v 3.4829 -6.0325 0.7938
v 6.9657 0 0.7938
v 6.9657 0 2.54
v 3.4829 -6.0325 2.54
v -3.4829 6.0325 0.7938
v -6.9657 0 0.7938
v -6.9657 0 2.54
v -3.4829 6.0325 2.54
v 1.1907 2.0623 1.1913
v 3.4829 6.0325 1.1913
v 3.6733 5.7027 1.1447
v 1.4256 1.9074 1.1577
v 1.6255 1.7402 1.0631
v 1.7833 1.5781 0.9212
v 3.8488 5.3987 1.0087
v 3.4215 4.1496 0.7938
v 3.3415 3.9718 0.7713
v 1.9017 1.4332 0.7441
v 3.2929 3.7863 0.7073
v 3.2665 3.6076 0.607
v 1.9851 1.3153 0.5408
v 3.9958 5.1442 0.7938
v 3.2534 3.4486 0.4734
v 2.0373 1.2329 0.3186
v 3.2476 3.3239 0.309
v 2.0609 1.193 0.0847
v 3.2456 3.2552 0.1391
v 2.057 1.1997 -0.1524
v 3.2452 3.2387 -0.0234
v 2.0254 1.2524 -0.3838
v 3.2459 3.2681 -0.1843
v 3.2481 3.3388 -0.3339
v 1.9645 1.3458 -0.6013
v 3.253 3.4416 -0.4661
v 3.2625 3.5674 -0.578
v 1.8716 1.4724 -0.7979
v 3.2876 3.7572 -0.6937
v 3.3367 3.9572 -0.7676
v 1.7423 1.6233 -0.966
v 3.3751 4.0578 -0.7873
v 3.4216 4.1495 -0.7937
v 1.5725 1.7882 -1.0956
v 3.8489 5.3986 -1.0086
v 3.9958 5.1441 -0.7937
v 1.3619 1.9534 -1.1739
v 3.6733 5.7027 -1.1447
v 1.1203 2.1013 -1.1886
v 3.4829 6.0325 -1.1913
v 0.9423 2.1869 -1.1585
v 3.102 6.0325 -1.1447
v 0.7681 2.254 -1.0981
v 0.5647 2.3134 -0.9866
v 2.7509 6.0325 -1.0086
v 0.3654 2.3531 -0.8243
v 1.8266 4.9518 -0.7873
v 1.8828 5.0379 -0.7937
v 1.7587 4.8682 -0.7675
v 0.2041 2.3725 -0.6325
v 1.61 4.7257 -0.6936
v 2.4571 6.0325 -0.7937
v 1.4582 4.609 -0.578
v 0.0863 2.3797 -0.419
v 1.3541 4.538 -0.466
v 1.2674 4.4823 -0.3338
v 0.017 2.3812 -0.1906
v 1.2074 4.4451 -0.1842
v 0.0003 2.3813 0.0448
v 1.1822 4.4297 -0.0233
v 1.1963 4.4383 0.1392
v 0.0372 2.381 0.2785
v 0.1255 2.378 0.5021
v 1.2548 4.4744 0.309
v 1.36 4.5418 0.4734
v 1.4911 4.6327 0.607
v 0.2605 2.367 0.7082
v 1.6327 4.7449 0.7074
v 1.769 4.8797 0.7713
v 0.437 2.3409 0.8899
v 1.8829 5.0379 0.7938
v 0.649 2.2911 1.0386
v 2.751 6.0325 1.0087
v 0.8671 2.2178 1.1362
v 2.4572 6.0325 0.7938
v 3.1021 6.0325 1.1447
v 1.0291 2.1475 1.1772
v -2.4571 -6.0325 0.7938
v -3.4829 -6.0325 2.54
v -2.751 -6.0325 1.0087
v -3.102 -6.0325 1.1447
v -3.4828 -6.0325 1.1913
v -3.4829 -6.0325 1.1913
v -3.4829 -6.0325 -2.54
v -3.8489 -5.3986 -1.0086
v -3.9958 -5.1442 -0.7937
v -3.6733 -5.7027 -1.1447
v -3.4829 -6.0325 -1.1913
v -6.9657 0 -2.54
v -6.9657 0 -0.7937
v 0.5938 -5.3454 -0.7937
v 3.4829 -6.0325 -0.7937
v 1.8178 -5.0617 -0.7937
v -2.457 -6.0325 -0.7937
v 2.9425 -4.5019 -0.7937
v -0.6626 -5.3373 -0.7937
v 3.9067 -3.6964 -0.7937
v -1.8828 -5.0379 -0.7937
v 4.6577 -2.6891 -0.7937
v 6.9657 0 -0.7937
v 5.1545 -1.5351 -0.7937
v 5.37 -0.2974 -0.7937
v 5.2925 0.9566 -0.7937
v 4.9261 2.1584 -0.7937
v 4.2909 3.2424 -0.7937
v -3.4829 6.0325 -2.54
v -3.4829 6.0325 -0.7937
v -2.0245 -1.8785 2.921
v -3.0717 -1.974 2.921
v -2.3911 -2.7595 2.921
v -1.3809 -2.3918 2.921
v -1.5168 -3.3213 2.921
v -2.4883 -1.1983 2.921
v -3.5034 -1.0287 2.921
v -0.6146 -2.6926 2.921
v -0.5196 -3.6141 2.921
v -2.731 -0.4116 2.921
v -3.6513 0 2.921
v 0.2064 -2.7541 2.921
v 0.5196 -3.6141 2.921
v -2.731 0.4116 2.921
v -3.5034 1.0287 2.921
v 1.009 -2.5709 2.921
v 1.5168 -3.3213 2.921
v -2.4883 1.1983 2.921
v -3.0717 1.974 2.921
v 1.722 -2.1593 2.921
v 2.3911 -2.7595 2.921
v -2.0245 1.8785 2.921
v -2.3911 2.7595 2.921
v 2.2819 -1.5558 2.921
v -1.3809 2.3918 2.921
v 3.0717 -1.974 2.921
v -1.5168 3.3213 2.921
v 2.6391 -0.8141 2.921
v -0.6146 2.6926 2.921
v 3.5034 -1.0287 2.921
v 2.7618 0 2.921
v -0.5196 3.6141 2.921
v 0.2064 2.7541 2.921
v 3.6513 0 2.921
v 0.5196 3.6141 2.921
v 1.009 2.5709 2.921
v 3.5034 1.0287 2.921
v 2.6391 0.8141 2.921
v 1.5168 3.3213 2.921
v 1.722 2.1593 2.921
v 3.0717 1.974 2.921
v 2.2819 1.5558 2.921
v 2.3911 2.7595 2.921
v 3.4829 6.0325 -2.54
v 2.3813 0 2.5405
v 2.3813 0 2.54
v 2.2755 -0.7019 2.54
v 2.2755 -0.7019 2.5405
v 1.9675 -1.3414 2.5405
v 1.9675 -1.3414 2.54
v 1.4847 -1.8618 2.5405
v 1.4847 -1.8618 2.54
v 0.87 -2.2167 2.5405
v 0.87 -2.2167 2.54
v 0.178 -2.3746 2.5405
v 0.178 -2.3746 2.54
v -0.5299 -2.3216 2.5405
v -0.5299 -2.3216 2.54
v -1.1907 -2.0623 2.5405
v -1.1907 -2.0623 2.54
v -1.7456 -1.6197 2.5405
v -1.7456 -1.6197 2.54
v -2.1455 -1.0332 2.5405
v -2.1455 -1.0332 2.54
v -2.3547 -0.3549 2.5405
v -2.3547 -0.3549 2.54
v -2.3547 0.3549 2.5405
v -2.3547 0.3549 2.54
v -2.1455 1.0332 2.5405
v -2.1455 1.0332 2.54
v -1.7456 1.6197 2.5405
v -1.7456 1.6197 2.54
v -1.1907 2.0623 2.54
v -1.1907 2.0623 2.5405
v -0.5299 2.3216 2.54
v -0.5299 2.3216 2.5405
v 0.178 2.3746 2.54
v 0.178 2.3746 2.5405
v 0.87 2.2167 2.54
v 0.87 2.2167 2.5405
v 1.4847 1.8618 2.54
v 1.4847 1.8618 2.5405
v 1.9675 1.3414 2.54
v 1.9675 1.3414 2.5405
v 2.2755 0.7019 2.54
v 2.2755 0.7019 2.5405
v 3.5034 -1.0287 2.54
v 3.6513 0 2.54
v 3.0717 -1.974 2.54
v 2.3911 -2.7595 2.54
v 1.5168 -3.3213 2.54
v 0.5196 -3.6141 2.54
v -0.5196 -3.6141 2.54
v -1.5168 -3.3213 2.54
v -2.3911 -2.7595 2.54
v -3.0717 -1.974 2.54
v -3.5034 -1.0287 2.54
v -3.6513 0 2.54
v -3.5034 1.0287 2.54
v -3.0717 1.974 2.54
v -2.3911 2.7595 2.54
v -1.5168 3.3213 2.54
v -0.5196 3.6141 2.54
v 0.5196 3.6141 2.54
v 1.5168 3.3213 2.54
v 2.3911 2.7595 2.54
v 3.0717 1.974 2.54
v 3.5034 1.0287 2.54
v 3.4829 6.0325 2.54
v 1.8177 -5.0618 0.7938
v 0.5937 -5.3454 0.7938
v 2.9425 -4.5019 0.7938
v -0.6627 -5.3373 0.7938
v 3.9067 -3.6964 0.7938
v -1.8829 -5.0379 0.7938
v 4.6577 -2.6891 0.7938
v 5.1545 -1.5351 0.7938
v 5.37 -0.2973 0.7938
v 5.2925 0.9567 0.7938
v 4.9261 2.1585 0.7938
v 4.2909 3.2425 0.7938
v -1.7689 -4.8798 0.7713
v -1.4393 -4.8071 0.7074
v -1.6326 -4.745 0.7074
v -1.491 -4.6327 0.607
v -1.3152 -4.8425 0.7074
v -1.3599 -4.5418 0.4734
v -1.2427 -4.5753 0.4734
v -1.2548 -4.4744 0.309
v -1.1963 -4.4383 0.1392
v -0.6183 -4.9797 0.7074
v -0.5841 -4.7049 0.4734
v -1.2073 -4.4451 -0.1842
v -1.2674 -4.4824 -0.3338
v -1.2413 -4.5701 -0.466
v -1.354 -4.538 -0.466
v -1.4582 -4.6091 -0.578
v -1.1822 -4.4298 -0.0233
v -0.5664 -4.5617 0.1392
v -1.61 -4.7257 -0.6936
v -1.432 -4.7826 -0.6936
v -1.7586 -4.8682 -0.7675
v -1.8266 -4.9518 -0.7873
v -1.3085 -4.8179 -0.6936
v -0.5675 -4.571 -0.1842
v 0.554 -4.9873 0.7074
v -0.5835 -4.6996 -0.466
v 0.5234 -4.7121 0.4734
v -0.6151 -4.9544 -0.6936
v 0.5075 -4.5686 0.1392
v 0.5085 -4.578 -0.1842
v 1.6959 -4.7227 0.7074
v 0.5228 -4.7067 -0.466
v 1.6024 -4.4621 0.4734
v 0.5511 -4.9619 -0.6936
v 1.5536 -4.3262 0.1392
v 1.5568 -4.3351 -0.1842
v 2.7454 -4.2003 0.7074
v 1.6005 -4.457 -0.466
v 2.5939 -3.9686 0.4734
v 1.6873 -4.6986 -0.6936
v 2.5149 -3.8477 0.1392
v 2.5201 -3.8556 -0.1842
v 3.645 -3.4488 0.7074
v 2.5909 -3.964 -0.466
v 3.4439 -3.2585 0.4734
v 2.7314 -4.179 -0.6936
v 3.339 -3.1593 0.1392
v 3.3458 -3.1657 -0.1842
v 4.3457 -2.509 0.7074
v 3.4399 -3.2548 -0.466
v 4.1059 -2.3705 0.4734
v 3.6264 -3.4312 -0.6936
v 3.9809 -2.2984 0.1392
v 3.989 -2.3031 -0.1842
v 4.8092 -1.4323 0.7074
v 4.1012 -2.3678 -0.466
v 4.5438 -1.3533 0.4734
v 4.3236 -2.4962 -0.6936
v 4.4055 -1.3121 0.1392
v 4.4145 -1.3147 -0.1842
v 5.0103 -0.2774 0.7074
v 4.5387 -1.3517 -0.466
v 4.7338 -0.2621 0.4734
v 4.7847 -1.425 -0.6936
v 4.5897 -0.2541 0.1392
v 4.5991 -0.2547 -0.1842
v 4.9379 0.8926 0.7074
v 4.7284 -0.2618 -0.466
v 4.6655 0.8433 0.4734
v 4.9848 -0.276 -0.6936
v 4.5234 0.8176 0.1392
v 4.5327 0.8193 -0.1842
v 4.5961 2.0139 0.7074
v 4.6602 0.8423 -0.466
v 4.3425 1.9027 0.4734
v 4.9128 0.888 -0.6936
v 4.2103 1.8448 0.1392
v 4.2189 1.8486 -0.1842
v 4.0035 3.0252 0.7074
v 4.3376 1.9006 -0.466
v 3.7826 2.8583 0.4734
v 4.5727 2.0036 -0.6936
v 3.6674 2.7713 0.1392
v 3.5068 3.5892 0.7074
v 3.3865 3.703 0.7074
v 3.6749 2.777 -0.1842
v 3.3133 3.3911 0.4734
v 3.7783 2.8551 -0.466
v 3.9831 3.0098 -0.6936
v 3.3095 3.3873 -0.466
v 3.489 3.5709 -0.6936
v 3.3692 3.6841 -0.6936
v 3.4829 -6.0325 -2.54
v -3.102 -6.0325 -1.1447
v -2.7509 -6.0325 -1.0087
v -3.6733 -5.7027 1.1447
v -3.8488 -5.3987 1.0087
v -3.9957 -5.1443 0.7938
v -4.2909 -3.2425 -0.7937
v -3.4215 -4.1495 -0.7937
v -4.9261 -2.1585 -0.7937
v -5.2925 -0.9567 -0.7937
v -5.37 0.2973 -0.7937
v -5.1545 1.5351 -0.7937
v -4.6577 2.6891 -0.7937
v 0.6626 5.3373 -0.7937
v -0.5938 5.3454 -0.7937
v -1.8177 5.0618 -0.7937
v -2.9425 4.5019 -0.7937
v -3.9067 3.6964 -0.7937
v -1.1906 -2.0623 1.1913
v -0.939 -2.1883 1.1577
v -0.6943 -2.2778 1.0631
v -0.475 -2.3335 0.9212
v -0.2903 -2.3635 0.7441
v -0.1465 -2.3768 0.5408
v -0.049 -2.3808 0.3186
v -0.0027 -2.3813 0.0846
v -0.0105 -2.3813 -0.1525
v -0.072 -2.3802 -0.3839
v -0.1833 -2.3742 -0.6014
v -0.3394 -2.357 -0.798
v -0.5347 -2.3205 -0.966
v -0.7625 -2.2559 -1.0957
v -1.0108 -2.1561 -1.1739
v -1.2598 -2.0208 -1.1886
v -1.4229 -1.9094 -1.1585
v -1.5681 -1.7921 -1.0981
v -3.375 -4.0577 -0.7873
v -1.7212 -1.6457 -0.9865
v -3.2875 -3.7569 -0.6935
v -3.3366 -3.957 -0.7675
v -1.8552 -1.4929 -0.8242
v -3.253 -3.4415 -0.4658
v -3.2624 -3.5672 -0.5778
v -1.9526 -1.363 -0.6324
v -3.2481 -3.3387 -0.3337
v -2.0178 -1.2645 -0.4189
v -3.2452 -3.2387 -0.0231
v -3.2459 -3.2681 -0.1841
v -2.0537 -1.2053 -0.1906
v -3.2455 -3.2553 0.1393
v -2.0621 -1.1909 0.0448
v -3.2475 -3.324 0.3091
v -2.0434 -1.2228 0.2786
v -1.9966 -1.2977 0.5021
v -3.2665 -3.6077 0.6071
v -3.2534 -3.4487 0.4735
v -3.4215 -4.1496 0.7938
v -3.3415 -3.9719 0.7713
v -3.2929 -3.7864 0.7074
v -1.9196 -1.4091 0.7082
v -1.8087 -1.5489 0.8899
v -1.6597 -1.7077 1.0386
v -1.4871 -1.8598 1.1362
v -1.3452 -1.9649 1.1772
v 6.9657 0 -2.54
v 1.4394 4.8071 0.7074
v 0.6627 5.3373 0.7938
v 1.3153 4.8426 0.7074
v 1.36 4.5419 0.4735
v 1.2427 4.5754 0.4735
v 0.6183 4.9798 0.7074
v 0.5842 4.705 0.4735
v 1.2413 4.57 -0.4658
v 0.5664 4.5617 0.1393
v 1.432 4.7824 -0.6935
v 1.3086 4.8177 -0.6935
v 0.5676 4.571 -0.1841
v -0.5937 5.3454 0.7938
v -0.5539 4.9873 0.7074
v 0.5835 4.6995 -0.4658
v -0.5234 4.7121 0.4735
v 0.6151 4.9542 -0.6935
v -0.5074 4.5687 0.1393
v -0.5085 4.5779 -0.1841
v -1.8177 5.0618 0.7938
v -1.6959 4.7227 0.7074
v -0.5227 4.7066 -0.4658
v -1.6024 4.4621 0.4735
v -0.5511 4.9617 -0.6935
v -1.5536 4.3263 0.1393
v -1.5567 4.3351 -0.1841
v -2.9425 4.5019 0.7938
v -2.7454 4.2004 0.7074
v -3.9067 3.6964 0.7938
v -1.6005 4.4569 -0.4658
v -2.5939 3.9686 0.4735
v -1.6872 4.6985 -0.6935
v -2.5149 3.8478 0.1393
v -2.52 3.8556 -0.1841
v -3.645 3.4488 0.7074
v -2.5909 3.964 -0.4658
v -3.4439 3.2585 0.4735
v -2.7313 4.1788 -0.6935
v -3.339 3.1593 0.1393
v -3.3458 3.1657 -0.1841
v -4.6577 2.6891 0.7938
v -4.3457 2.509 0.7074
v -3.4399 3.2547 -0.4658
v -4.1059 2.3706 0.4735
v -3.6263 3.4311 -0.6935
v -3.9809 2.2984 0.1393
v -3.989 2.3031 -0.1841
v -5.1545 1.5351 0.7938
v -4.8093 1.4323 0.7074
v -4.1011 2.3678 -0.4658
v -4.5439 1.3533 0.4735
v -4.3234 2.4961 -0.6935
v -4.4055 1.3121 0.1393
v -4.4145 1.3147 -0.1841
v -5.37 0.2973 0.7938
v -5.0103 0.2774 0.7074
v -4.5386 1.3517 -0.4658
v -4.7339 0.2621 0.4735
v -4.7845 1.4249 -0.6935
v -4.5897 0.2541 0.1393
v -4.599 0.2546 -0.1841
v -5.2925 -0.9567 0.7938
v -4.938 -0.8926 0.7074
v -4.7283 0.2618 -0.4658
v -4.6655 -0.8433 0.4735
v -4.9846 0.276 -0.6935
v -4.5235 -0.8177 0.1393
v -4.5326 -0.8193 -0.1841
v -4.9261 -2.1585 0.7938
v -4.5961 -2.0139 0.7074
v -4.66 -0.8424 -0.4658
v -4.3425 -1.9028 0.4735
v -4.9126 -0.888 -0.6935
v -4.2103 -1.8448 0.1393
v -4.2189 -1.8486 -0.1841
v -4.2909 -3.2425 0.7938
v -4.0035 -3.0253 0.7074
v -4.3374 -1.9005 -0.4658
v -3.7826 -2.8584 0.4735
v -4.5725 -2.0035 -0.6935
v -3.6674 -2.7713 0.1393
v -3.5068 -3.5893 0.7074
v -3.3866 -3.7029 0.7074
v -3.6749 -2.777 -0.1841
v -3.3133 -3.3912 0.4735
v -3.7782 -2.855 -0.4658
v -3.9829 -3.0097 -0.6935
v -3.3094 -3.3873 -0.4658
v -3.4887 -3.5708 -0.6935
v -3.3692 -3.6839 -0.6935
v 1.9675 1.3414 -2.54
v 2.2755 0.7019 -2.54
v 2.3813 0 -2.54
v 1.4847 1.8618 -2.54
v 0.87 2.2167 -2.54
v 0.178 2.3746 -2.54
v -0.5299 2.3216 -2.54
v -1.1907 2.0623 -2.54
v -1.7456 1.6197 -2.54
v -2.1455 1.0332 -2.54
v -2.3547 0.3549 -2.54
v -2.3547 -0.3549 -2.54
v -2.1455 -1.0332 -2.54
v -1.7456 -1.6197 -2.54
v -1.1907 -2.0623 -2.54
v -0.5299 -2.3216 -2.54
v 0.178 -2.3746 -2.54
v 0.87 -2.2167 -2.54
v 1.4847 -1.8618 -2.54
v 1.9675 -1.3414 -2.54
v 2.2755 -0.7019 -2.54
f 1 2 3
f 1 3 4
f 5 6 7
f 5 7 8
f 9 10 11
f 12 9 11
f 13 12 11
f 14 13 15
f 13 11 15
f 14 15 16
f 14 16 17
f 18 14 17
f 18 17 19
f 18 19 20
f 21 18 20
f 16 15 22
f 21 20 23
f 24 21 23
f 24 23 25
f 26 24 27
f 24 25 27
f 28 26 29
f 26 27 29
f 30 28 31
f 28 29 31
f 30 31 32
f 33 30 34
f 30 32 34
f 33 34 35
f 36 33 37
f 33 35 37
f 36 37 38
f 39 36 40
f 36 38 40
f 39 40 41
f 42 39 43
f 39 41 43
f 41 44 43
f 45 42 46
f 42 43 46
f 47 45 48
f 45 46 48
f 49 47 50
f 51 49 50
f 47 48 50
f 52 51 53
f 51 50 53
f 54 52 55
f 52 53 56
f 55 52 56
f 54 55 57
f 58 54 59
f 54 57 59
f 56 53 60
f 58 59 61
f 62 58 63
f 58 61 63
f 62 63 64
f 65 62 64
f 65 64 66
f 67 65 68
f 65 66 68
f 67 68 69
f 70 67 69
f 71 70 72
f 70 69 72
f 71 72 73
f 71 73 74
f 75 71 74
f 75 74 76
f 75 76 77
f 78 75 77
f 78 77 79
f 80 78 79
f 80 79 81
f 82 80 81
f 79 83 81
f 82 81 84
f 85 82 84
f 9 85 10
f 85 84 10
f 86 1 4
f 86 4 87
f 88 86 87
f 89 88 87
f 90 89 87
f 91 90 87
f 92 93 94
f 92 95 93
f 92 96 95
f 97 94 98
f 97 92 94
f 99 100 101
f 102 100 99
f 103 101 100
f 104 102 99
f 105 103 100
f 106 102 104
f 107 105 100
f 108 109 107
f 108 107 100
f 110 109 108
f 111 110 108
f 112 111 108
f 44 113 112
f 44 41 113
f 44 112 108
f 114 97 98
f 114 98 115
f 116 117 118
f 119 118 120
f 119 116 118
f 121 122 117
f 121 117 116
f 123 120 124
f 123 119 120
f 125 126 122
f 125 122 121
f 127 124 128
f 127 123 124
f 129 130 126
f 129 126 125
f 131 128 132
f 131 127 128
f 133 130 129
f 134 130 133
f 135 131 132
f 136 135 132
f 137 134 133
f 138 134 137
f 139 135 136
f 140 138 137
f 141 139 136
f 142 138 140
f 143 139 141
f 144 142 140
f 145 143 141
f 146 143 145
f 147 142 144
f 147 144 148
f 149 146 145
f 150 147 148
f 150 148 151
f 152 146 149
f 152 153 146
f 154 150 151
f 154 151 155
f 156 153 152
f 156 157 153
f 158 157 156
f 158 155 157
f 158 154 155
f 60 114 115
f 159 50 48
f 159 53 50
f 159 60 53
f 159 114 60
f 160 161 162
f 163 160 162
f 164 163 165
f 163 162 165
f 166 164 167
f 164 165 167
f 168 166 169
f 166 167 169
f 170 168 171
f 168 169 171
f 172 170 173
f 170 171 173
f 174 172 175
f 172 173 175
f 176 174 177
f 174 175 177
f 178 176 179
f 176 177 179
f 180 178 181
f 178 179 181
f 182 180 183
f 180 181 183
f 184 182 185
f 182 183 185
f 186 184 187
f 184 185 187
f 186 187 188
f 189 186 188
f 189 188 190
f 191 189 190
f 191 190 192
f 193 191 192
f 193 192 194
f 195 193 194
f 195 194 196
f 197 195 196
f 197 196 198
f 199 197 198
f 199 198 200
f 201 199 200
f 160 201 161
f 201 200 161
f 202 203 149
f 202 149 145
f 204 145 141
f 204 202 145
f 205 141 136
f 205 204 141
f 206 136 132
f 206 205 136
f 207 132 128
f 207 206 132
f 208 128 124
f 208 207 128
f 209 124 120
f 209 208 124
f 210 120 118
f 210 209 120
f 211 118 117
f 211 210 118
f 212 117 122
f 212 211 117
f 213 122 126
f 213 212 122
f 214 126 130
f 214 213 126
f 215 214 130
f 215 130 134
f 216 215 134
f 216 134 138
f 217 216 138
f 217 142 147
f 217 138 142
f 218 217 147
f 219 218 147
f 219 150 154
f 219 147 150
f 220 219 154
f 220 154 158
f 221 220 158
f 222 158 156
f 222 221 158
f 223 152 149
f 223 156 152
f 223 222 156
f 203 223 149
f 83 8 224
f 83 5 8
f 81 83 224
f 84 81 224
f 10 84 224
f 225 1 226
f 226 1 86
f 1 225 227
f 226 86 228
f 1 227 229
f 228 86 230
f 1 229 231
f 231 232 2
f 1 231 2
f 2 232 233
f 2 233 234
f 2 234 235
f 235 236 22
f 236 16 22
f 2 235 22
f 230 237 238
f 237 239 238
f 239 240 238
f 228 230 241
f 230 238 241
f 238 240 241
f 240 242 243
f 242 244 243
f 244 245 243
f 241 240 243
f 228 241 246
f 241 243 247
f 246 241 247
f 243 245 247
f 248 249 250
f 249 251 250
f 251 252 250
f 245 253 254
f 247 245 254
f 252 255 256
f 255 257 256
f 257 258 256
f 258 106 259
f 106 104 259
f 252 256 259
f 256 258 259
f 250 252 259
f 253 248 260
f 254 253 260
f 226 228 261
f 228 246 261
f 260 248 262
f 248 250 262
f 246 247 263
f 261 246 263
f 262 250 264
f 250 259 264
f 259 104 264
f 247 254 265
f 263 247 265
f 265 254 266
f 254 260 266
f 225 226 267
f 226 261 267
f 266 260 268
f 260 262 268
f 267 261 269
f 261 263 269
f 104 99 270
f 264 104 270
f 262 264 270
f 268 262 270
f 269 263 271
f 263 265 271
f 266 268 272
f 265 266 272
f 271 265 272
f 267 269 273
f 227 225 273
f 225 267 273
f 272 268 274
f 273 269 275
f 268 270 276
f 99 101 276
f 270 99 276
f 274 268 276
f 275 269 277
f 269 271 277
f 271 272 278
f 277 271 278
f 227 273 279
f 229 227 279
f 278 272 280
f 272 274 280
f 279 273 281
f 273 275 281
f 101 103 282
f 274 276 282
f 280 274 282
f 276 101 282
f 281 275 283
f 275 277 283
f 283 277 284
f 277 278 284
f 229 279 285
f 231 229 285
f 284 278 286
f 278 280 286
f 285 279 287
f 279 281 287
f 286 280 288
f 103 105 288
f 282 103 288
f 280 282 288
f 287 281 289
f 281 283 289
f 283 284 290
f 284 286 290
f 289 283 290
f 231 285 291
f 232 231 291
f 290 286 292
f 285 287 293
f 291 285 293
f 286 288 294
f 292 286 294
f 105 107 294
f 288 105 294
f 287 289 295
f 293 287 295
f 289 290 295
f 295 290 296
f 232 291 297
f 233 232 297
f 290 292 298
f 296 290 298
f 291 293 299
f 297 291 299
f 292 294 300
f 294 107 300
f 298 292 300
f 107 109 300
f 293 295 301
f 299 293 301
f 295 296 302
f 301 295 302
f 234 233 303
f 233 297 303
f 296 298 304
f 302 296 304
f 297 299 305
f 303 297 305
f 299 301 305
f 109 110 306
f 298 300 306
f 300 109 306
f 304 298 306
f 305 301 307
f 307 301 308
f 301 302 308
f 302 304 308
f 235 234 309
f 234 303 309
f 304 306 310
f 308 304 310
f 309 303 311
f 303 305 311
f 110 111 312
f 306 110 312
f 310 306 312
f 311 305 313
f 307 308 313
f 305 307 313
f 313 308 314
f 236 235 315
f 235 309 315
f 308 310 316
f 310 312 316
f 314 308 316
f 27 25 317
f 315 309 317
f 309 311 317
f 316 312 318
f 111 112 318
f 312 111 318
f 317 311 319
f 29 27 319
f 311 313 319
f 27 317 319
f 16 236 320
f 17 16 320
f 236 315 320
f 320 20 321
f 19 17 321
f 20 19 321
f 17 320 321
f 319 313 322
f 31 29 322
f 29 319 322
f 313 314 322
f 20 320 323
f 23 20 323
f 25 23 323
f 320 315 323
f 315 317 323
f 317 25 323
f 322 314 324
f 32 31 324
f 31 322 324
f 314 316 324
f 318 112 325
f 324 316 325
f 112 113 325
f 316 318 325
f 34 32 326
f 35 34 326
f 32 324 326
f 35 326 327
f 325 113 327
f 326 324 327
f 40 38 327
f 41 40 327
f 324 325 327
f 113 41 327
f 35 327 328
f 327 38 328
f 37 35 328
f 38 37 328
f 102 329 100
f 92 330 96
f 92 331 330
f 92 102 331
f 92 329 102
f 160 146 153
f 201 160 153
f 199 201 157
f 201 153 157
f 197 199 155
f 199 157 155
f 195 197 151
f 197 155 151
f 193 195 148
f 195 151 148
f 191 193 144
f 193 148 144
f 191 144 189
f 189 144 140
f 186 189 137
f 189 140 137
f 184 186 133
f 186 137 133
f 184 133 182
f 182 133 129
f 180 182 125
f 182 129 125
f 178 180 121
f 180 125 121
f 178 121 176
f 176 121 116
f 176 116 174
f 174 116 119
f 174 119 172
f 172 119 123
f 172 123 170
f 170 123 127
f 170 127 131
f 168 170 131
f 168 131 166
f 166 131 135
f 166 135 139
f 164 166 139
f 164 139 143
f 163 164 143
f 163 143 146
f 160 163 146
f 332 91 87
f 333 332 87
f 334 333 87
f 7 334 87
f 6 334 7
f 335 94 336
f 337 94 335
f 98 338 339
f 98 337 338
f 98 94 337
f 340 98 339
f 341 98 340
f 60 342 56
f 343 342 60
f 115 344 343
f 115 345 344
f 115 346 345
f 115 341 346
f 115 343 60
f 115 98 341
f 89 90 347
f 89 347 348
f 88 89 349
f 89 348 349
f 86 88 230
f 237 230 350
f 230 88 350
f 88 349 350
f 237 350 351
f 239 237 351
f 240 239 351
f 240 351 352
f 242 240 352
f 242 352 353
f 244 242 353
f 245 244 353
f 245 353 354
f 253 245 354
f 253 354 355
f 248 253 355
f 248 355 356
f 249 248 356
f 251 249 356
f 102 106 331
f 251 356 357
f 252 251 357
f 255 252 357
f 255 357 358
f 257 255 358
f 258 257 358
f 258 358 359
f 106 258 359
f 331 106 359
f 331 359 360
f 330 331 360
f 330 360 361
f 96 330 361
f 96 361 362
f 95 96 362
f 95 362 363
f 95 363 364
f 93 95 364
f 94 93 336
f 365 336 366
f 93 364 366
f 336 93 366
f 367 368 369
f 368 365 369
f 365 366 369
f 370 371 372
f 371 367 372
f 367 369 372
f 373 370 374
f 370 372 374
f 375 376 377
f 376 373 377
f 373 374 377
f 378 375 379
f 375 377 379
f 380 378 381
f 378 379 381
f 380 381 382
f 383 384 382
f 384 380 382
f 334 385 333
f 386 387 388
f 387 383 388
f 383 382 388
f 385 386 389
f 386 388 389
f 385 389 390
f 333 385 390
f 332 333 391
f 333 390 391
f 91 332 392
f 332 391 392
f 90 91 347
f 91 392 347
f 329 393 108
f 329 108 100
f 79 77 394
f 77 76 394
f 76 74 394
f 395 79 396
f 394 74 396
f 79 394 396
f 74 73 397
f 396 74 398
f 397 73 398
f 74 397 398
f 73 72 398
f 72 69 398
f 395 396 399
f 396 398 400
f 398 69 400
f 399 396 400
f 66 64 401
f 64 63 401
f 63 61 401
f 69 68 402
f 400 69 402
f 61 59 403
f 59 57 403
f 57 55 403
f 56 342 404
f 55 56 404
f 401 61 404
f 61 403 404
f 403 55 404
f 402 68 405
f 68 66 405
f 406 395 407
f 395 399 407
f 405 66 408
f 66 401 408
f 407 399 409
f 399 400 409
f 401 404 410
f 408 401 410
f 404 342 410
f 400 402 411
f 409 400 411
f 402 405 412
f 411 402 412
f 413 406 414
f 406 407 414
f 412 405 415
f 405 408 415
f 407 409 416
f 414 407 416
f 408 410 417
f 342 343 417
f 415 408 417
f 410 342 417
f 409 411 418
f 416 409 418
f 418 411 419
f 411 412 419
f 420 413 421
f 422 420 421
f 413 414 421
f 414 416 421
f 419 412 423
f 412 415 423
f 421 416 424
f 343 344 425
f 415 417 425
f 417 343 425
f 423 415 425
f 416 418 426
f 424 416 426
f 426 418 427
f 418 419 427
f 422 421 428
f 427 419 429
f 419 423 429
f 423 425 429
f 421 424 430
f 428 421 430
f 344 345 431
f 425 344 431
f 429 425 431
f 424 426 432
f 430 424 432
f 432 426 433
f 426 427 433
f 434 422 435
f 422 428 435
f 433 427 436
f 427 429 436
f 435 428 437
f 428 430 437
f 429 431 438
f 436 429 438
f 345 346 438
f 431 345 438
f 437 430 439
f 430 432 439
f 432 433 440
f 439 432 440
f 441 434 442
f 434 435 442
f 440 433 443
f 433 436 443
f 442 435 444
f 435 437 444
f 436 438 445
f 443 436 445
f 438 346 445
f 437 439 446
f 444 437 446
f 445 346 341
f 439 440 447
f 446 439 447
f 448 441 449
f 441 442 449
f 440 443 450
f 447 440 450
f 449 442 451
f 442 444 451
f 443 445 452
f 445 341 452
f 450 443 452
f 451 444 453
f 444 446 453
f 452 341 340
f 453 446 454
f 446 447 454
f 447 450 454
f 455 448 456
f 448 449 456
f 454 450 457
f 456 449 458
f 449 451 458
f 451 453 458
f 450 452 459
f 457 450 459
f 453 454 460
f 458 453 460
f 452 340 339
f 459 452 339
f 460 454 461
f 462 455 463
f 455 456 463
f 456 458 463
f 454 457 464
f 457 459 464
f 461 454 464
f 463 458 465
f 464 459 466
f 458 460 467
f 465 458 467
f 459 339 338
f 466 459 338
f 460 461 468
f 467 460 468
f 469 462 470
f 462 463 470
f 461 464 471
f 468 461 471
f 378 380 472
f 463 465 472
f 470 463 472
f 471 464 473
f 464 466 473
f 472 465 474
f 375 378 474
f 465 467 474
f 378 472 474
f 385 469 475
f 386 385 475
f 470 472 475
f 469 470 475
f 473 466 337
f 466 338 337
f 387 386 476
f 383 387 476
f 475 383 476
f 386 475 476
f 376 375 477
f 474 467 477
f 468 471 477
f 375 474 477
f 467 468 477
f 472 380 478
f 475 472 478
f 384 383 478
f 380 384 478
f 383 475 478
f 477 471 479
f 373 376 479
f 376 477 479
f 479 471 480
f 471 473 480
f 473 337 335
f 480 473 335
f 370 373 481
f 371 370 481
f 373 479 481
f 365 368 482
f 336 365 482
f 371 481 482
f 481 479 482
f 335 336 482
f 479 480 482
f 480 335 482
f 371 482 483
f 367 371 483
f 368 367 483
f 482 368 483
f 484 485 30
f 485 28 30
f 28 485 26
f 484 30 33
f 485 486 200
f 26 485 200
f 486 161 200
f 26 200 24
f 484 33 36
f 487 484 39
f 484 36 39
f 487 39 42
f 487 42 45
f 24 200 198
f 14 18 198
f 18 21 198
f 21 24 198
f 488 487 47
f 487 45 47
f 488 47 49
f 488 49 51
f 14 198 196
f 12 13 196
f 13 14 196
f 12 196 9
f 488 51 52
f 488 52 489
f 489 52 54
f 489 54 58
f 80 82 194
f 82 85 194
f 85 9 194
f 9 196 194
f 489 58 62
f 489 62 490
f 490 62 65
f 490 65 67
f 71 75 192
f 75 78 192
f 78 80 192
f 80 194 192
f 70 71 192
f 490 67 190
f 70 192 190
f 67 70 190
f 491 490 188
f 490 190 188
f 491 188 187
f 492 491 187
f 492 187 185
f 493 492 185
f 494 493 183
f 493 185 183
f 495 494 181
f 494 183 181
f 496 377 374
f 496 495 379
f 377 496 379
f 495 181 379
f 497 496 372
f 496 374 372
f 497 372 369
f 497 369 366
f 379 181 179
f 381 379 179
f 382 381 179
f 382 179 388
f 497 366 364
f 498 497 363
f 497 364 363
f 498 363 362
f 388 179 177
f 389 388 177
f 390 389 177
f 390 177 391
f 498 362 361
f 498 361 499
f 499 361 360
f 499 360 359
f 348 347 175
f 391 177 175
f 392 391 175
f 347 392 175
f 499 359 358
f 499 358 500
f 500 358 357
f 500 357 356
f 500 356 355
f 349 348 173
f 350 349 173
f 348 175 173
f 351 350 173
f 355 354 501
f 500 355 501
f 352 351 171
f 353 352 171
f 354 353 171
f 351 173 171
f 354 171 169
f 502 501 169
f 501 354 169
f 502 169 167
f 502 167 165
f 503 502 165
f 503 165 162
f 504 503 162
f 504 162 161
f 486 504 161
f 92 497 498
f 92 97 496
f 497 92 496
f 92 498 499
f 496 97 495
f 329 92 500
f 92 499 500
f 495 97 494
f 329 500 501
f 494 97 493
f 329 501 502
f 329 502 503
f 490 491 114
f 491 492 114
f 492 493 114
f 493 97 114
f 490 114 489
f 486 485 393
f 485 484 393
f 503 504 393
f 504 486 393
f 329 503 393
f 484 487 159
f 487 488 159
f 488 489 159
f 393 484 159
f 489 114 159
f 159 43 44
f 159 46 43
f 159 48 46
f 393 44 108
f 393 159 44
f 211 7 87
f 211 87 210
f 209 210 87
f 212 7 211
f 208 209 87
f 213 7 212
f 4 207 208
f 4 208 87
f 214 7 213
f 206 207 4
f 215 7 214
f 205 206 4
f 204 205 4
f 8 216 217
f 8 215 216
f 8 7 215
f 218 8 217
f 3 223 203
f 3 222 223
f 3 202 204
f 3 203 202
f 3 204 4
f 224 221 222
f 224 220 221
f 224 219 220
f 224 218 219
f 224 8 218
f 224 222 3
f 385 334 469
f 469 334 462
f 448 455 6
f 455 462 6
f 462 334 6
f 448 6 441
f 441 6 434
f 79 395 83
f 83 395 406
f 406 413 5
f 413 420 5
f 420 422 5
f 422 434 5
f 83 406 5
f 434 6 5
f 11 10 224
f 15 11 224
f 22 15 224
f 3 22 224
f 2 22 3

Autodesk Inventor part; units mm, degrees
ref_plane "YZ Plane" through (0, 0, 0) normal (1, 0, 0) x (0, 1, 0)
sketch "Sketch1" plane through (0, 0, 0) normal (0, 0, 1) x (1, 0, 0)
  circle A0 centre (0, 0) radius 6.0325 construction
  line L0 (3.4829, 6.0325) -> (6.9657, 0)
  line L1 (6.9657, 0) -> (3.4829, -6.0325)
  line L2 (3.4829, -6.0325) -> (-3.4829, -6.0325)
  line L3 (-3.4829, -6.0325) -> (-6.9657, 0)
  line L4 (-6.9657, 0) -> (-3.4829, 6.0325)
  line L5 (-3.4829, 6.0325) -> (3.4829, 6.0325)
  point P0 (0, 6.0325)
  dimension "d0" = 12.065
extrude "Extrusion1" add sketch "Sketch1" along normal mid plane 5.08
sketch "Sketch2" plane through (0, 0, 2.54) normal (0, 0, 1) x (1, 0, 0)
  circle A0 centre (0, 0) radius 2.3813
  circle A1 centre (0, 0) radius 3.6513
  dimension "d3" = 4.7625
  dimension "d4" = 1.27
extrude "Extrusion2" add sketch "Sketch2" along normal blind 0.381
extrude "Extrusion3" cut sketch "Sketch2" against normal through all contours A0
chamfer "Chamfer1" distance 0.381 angle 45 1 edges at (-2.3813, 0, 2.921)
ref_plane "Work Plane1" through (3.4829, 6.0325, 0) normal (0.5, 0.866, 0) x (0, 0, 1)
sketch "Sketch3" plane through (3.4829, 6.0325, 0) normal (0.5, 0.866, 0) x (0, 0, 1)
  circle A0 centre (0, 0) radius 1.1913
  dimension "d13" = 2.3825
extrude "Extrusion4" cut sketch "Sketch3" against normal through all
ref_plane "Work Plane2" through (3.4829, 6.0325, 0) normal (0.866, -0.5, 0) x (0, 0, 1)
sketch "Sketch4" plane through (3.4829, 6.0325, 0) normal (0.866, -0.5, 0) x (0, 0, 1)
  line L0 (-1.1913, 4.5845) -> (-1.1913, 0) construction
  line L1 (-1.1913, 0) -> (-2.54, 0) construction
  line L2 (-2.54, 0) -> (-2.54, 4.5845) construction
  line L3 (-2.54, 4.5845) -> (-1.1913, 4.5845) construction
  line L4 (-1.1913, 13.9315) -> (-1.1913, 9.347) construction
  line L5 (-1.1913, 9.347) -> (-2.54, 9.347) construction
  line L6 (-2.54, 9.347) -> (-2.54, 13.9315) construction
  line L7 (-2.54, 13.9315) -> (-1.1913, 13.9315) construction
  line L8 (2.921, 9.728) -> (2.54, 9.347) construction
  line L9 (2.54, 9.347) -> (1.1913, 9.347) construction
  line L10 (1.1913, 9.347) -> (1.1913, 13.9315) construction
  line L11 (1.1913, 13.9315) -> (2.54, 13.9315) construction
  line L12 (2.54, 13.9315) -> (2.54, 10.617) construction
  line L13 (2.54, 10.617) -> (2.921, 10.617) construction
  line L14 (2.921, 10.617) -> (2.921, 9.728) construction
  line L15 (2.54, 4.5845) -> (2.921, 4.2035) construction
  line L16 (2.921, 4.2035) -> (2.921, 3.3145) construction
  line L17 (2.921, 3.3145) -> (2.54, 3.3145) construction
  line L18 (2.54, 3.3145) -> (2.54, 0) construction
  line L19 (2.54, 0) -> (1.1913, 0) construction
  line L20 (1.1913, 0) -> (1.1913, 4.5845) construction
  line L21 (1.1913, 4.5845) -> (2.54, 4.5845) construction
  line L22 (-0.7937, 0) -> (-0.7937, 1.5875)
  arc A0 (0.7938, 1.5875) -> (-0.7937, 1.5875) centre (0, 1.5875) ccw
  line L23 (0.7938, 1.5875) -> (0.7938, 0)
  line L24 (0.7938, 0) -> (-0.7937, 0)
  line L25 (-3.6322, 6.9657) -> (4.0132, 6.9657) projected
  point P0 (0, 6.9657)
  dimension "d16" = 1.5875
  dimension "d17" = 1.5875
revolve "Revolution1" cut sketch "Sketch4" angle 360 about axis through (0, 0, -10) along (0, 0, 1)
equation "\"d17\" = d16"
properties part number "Hex Drive"
